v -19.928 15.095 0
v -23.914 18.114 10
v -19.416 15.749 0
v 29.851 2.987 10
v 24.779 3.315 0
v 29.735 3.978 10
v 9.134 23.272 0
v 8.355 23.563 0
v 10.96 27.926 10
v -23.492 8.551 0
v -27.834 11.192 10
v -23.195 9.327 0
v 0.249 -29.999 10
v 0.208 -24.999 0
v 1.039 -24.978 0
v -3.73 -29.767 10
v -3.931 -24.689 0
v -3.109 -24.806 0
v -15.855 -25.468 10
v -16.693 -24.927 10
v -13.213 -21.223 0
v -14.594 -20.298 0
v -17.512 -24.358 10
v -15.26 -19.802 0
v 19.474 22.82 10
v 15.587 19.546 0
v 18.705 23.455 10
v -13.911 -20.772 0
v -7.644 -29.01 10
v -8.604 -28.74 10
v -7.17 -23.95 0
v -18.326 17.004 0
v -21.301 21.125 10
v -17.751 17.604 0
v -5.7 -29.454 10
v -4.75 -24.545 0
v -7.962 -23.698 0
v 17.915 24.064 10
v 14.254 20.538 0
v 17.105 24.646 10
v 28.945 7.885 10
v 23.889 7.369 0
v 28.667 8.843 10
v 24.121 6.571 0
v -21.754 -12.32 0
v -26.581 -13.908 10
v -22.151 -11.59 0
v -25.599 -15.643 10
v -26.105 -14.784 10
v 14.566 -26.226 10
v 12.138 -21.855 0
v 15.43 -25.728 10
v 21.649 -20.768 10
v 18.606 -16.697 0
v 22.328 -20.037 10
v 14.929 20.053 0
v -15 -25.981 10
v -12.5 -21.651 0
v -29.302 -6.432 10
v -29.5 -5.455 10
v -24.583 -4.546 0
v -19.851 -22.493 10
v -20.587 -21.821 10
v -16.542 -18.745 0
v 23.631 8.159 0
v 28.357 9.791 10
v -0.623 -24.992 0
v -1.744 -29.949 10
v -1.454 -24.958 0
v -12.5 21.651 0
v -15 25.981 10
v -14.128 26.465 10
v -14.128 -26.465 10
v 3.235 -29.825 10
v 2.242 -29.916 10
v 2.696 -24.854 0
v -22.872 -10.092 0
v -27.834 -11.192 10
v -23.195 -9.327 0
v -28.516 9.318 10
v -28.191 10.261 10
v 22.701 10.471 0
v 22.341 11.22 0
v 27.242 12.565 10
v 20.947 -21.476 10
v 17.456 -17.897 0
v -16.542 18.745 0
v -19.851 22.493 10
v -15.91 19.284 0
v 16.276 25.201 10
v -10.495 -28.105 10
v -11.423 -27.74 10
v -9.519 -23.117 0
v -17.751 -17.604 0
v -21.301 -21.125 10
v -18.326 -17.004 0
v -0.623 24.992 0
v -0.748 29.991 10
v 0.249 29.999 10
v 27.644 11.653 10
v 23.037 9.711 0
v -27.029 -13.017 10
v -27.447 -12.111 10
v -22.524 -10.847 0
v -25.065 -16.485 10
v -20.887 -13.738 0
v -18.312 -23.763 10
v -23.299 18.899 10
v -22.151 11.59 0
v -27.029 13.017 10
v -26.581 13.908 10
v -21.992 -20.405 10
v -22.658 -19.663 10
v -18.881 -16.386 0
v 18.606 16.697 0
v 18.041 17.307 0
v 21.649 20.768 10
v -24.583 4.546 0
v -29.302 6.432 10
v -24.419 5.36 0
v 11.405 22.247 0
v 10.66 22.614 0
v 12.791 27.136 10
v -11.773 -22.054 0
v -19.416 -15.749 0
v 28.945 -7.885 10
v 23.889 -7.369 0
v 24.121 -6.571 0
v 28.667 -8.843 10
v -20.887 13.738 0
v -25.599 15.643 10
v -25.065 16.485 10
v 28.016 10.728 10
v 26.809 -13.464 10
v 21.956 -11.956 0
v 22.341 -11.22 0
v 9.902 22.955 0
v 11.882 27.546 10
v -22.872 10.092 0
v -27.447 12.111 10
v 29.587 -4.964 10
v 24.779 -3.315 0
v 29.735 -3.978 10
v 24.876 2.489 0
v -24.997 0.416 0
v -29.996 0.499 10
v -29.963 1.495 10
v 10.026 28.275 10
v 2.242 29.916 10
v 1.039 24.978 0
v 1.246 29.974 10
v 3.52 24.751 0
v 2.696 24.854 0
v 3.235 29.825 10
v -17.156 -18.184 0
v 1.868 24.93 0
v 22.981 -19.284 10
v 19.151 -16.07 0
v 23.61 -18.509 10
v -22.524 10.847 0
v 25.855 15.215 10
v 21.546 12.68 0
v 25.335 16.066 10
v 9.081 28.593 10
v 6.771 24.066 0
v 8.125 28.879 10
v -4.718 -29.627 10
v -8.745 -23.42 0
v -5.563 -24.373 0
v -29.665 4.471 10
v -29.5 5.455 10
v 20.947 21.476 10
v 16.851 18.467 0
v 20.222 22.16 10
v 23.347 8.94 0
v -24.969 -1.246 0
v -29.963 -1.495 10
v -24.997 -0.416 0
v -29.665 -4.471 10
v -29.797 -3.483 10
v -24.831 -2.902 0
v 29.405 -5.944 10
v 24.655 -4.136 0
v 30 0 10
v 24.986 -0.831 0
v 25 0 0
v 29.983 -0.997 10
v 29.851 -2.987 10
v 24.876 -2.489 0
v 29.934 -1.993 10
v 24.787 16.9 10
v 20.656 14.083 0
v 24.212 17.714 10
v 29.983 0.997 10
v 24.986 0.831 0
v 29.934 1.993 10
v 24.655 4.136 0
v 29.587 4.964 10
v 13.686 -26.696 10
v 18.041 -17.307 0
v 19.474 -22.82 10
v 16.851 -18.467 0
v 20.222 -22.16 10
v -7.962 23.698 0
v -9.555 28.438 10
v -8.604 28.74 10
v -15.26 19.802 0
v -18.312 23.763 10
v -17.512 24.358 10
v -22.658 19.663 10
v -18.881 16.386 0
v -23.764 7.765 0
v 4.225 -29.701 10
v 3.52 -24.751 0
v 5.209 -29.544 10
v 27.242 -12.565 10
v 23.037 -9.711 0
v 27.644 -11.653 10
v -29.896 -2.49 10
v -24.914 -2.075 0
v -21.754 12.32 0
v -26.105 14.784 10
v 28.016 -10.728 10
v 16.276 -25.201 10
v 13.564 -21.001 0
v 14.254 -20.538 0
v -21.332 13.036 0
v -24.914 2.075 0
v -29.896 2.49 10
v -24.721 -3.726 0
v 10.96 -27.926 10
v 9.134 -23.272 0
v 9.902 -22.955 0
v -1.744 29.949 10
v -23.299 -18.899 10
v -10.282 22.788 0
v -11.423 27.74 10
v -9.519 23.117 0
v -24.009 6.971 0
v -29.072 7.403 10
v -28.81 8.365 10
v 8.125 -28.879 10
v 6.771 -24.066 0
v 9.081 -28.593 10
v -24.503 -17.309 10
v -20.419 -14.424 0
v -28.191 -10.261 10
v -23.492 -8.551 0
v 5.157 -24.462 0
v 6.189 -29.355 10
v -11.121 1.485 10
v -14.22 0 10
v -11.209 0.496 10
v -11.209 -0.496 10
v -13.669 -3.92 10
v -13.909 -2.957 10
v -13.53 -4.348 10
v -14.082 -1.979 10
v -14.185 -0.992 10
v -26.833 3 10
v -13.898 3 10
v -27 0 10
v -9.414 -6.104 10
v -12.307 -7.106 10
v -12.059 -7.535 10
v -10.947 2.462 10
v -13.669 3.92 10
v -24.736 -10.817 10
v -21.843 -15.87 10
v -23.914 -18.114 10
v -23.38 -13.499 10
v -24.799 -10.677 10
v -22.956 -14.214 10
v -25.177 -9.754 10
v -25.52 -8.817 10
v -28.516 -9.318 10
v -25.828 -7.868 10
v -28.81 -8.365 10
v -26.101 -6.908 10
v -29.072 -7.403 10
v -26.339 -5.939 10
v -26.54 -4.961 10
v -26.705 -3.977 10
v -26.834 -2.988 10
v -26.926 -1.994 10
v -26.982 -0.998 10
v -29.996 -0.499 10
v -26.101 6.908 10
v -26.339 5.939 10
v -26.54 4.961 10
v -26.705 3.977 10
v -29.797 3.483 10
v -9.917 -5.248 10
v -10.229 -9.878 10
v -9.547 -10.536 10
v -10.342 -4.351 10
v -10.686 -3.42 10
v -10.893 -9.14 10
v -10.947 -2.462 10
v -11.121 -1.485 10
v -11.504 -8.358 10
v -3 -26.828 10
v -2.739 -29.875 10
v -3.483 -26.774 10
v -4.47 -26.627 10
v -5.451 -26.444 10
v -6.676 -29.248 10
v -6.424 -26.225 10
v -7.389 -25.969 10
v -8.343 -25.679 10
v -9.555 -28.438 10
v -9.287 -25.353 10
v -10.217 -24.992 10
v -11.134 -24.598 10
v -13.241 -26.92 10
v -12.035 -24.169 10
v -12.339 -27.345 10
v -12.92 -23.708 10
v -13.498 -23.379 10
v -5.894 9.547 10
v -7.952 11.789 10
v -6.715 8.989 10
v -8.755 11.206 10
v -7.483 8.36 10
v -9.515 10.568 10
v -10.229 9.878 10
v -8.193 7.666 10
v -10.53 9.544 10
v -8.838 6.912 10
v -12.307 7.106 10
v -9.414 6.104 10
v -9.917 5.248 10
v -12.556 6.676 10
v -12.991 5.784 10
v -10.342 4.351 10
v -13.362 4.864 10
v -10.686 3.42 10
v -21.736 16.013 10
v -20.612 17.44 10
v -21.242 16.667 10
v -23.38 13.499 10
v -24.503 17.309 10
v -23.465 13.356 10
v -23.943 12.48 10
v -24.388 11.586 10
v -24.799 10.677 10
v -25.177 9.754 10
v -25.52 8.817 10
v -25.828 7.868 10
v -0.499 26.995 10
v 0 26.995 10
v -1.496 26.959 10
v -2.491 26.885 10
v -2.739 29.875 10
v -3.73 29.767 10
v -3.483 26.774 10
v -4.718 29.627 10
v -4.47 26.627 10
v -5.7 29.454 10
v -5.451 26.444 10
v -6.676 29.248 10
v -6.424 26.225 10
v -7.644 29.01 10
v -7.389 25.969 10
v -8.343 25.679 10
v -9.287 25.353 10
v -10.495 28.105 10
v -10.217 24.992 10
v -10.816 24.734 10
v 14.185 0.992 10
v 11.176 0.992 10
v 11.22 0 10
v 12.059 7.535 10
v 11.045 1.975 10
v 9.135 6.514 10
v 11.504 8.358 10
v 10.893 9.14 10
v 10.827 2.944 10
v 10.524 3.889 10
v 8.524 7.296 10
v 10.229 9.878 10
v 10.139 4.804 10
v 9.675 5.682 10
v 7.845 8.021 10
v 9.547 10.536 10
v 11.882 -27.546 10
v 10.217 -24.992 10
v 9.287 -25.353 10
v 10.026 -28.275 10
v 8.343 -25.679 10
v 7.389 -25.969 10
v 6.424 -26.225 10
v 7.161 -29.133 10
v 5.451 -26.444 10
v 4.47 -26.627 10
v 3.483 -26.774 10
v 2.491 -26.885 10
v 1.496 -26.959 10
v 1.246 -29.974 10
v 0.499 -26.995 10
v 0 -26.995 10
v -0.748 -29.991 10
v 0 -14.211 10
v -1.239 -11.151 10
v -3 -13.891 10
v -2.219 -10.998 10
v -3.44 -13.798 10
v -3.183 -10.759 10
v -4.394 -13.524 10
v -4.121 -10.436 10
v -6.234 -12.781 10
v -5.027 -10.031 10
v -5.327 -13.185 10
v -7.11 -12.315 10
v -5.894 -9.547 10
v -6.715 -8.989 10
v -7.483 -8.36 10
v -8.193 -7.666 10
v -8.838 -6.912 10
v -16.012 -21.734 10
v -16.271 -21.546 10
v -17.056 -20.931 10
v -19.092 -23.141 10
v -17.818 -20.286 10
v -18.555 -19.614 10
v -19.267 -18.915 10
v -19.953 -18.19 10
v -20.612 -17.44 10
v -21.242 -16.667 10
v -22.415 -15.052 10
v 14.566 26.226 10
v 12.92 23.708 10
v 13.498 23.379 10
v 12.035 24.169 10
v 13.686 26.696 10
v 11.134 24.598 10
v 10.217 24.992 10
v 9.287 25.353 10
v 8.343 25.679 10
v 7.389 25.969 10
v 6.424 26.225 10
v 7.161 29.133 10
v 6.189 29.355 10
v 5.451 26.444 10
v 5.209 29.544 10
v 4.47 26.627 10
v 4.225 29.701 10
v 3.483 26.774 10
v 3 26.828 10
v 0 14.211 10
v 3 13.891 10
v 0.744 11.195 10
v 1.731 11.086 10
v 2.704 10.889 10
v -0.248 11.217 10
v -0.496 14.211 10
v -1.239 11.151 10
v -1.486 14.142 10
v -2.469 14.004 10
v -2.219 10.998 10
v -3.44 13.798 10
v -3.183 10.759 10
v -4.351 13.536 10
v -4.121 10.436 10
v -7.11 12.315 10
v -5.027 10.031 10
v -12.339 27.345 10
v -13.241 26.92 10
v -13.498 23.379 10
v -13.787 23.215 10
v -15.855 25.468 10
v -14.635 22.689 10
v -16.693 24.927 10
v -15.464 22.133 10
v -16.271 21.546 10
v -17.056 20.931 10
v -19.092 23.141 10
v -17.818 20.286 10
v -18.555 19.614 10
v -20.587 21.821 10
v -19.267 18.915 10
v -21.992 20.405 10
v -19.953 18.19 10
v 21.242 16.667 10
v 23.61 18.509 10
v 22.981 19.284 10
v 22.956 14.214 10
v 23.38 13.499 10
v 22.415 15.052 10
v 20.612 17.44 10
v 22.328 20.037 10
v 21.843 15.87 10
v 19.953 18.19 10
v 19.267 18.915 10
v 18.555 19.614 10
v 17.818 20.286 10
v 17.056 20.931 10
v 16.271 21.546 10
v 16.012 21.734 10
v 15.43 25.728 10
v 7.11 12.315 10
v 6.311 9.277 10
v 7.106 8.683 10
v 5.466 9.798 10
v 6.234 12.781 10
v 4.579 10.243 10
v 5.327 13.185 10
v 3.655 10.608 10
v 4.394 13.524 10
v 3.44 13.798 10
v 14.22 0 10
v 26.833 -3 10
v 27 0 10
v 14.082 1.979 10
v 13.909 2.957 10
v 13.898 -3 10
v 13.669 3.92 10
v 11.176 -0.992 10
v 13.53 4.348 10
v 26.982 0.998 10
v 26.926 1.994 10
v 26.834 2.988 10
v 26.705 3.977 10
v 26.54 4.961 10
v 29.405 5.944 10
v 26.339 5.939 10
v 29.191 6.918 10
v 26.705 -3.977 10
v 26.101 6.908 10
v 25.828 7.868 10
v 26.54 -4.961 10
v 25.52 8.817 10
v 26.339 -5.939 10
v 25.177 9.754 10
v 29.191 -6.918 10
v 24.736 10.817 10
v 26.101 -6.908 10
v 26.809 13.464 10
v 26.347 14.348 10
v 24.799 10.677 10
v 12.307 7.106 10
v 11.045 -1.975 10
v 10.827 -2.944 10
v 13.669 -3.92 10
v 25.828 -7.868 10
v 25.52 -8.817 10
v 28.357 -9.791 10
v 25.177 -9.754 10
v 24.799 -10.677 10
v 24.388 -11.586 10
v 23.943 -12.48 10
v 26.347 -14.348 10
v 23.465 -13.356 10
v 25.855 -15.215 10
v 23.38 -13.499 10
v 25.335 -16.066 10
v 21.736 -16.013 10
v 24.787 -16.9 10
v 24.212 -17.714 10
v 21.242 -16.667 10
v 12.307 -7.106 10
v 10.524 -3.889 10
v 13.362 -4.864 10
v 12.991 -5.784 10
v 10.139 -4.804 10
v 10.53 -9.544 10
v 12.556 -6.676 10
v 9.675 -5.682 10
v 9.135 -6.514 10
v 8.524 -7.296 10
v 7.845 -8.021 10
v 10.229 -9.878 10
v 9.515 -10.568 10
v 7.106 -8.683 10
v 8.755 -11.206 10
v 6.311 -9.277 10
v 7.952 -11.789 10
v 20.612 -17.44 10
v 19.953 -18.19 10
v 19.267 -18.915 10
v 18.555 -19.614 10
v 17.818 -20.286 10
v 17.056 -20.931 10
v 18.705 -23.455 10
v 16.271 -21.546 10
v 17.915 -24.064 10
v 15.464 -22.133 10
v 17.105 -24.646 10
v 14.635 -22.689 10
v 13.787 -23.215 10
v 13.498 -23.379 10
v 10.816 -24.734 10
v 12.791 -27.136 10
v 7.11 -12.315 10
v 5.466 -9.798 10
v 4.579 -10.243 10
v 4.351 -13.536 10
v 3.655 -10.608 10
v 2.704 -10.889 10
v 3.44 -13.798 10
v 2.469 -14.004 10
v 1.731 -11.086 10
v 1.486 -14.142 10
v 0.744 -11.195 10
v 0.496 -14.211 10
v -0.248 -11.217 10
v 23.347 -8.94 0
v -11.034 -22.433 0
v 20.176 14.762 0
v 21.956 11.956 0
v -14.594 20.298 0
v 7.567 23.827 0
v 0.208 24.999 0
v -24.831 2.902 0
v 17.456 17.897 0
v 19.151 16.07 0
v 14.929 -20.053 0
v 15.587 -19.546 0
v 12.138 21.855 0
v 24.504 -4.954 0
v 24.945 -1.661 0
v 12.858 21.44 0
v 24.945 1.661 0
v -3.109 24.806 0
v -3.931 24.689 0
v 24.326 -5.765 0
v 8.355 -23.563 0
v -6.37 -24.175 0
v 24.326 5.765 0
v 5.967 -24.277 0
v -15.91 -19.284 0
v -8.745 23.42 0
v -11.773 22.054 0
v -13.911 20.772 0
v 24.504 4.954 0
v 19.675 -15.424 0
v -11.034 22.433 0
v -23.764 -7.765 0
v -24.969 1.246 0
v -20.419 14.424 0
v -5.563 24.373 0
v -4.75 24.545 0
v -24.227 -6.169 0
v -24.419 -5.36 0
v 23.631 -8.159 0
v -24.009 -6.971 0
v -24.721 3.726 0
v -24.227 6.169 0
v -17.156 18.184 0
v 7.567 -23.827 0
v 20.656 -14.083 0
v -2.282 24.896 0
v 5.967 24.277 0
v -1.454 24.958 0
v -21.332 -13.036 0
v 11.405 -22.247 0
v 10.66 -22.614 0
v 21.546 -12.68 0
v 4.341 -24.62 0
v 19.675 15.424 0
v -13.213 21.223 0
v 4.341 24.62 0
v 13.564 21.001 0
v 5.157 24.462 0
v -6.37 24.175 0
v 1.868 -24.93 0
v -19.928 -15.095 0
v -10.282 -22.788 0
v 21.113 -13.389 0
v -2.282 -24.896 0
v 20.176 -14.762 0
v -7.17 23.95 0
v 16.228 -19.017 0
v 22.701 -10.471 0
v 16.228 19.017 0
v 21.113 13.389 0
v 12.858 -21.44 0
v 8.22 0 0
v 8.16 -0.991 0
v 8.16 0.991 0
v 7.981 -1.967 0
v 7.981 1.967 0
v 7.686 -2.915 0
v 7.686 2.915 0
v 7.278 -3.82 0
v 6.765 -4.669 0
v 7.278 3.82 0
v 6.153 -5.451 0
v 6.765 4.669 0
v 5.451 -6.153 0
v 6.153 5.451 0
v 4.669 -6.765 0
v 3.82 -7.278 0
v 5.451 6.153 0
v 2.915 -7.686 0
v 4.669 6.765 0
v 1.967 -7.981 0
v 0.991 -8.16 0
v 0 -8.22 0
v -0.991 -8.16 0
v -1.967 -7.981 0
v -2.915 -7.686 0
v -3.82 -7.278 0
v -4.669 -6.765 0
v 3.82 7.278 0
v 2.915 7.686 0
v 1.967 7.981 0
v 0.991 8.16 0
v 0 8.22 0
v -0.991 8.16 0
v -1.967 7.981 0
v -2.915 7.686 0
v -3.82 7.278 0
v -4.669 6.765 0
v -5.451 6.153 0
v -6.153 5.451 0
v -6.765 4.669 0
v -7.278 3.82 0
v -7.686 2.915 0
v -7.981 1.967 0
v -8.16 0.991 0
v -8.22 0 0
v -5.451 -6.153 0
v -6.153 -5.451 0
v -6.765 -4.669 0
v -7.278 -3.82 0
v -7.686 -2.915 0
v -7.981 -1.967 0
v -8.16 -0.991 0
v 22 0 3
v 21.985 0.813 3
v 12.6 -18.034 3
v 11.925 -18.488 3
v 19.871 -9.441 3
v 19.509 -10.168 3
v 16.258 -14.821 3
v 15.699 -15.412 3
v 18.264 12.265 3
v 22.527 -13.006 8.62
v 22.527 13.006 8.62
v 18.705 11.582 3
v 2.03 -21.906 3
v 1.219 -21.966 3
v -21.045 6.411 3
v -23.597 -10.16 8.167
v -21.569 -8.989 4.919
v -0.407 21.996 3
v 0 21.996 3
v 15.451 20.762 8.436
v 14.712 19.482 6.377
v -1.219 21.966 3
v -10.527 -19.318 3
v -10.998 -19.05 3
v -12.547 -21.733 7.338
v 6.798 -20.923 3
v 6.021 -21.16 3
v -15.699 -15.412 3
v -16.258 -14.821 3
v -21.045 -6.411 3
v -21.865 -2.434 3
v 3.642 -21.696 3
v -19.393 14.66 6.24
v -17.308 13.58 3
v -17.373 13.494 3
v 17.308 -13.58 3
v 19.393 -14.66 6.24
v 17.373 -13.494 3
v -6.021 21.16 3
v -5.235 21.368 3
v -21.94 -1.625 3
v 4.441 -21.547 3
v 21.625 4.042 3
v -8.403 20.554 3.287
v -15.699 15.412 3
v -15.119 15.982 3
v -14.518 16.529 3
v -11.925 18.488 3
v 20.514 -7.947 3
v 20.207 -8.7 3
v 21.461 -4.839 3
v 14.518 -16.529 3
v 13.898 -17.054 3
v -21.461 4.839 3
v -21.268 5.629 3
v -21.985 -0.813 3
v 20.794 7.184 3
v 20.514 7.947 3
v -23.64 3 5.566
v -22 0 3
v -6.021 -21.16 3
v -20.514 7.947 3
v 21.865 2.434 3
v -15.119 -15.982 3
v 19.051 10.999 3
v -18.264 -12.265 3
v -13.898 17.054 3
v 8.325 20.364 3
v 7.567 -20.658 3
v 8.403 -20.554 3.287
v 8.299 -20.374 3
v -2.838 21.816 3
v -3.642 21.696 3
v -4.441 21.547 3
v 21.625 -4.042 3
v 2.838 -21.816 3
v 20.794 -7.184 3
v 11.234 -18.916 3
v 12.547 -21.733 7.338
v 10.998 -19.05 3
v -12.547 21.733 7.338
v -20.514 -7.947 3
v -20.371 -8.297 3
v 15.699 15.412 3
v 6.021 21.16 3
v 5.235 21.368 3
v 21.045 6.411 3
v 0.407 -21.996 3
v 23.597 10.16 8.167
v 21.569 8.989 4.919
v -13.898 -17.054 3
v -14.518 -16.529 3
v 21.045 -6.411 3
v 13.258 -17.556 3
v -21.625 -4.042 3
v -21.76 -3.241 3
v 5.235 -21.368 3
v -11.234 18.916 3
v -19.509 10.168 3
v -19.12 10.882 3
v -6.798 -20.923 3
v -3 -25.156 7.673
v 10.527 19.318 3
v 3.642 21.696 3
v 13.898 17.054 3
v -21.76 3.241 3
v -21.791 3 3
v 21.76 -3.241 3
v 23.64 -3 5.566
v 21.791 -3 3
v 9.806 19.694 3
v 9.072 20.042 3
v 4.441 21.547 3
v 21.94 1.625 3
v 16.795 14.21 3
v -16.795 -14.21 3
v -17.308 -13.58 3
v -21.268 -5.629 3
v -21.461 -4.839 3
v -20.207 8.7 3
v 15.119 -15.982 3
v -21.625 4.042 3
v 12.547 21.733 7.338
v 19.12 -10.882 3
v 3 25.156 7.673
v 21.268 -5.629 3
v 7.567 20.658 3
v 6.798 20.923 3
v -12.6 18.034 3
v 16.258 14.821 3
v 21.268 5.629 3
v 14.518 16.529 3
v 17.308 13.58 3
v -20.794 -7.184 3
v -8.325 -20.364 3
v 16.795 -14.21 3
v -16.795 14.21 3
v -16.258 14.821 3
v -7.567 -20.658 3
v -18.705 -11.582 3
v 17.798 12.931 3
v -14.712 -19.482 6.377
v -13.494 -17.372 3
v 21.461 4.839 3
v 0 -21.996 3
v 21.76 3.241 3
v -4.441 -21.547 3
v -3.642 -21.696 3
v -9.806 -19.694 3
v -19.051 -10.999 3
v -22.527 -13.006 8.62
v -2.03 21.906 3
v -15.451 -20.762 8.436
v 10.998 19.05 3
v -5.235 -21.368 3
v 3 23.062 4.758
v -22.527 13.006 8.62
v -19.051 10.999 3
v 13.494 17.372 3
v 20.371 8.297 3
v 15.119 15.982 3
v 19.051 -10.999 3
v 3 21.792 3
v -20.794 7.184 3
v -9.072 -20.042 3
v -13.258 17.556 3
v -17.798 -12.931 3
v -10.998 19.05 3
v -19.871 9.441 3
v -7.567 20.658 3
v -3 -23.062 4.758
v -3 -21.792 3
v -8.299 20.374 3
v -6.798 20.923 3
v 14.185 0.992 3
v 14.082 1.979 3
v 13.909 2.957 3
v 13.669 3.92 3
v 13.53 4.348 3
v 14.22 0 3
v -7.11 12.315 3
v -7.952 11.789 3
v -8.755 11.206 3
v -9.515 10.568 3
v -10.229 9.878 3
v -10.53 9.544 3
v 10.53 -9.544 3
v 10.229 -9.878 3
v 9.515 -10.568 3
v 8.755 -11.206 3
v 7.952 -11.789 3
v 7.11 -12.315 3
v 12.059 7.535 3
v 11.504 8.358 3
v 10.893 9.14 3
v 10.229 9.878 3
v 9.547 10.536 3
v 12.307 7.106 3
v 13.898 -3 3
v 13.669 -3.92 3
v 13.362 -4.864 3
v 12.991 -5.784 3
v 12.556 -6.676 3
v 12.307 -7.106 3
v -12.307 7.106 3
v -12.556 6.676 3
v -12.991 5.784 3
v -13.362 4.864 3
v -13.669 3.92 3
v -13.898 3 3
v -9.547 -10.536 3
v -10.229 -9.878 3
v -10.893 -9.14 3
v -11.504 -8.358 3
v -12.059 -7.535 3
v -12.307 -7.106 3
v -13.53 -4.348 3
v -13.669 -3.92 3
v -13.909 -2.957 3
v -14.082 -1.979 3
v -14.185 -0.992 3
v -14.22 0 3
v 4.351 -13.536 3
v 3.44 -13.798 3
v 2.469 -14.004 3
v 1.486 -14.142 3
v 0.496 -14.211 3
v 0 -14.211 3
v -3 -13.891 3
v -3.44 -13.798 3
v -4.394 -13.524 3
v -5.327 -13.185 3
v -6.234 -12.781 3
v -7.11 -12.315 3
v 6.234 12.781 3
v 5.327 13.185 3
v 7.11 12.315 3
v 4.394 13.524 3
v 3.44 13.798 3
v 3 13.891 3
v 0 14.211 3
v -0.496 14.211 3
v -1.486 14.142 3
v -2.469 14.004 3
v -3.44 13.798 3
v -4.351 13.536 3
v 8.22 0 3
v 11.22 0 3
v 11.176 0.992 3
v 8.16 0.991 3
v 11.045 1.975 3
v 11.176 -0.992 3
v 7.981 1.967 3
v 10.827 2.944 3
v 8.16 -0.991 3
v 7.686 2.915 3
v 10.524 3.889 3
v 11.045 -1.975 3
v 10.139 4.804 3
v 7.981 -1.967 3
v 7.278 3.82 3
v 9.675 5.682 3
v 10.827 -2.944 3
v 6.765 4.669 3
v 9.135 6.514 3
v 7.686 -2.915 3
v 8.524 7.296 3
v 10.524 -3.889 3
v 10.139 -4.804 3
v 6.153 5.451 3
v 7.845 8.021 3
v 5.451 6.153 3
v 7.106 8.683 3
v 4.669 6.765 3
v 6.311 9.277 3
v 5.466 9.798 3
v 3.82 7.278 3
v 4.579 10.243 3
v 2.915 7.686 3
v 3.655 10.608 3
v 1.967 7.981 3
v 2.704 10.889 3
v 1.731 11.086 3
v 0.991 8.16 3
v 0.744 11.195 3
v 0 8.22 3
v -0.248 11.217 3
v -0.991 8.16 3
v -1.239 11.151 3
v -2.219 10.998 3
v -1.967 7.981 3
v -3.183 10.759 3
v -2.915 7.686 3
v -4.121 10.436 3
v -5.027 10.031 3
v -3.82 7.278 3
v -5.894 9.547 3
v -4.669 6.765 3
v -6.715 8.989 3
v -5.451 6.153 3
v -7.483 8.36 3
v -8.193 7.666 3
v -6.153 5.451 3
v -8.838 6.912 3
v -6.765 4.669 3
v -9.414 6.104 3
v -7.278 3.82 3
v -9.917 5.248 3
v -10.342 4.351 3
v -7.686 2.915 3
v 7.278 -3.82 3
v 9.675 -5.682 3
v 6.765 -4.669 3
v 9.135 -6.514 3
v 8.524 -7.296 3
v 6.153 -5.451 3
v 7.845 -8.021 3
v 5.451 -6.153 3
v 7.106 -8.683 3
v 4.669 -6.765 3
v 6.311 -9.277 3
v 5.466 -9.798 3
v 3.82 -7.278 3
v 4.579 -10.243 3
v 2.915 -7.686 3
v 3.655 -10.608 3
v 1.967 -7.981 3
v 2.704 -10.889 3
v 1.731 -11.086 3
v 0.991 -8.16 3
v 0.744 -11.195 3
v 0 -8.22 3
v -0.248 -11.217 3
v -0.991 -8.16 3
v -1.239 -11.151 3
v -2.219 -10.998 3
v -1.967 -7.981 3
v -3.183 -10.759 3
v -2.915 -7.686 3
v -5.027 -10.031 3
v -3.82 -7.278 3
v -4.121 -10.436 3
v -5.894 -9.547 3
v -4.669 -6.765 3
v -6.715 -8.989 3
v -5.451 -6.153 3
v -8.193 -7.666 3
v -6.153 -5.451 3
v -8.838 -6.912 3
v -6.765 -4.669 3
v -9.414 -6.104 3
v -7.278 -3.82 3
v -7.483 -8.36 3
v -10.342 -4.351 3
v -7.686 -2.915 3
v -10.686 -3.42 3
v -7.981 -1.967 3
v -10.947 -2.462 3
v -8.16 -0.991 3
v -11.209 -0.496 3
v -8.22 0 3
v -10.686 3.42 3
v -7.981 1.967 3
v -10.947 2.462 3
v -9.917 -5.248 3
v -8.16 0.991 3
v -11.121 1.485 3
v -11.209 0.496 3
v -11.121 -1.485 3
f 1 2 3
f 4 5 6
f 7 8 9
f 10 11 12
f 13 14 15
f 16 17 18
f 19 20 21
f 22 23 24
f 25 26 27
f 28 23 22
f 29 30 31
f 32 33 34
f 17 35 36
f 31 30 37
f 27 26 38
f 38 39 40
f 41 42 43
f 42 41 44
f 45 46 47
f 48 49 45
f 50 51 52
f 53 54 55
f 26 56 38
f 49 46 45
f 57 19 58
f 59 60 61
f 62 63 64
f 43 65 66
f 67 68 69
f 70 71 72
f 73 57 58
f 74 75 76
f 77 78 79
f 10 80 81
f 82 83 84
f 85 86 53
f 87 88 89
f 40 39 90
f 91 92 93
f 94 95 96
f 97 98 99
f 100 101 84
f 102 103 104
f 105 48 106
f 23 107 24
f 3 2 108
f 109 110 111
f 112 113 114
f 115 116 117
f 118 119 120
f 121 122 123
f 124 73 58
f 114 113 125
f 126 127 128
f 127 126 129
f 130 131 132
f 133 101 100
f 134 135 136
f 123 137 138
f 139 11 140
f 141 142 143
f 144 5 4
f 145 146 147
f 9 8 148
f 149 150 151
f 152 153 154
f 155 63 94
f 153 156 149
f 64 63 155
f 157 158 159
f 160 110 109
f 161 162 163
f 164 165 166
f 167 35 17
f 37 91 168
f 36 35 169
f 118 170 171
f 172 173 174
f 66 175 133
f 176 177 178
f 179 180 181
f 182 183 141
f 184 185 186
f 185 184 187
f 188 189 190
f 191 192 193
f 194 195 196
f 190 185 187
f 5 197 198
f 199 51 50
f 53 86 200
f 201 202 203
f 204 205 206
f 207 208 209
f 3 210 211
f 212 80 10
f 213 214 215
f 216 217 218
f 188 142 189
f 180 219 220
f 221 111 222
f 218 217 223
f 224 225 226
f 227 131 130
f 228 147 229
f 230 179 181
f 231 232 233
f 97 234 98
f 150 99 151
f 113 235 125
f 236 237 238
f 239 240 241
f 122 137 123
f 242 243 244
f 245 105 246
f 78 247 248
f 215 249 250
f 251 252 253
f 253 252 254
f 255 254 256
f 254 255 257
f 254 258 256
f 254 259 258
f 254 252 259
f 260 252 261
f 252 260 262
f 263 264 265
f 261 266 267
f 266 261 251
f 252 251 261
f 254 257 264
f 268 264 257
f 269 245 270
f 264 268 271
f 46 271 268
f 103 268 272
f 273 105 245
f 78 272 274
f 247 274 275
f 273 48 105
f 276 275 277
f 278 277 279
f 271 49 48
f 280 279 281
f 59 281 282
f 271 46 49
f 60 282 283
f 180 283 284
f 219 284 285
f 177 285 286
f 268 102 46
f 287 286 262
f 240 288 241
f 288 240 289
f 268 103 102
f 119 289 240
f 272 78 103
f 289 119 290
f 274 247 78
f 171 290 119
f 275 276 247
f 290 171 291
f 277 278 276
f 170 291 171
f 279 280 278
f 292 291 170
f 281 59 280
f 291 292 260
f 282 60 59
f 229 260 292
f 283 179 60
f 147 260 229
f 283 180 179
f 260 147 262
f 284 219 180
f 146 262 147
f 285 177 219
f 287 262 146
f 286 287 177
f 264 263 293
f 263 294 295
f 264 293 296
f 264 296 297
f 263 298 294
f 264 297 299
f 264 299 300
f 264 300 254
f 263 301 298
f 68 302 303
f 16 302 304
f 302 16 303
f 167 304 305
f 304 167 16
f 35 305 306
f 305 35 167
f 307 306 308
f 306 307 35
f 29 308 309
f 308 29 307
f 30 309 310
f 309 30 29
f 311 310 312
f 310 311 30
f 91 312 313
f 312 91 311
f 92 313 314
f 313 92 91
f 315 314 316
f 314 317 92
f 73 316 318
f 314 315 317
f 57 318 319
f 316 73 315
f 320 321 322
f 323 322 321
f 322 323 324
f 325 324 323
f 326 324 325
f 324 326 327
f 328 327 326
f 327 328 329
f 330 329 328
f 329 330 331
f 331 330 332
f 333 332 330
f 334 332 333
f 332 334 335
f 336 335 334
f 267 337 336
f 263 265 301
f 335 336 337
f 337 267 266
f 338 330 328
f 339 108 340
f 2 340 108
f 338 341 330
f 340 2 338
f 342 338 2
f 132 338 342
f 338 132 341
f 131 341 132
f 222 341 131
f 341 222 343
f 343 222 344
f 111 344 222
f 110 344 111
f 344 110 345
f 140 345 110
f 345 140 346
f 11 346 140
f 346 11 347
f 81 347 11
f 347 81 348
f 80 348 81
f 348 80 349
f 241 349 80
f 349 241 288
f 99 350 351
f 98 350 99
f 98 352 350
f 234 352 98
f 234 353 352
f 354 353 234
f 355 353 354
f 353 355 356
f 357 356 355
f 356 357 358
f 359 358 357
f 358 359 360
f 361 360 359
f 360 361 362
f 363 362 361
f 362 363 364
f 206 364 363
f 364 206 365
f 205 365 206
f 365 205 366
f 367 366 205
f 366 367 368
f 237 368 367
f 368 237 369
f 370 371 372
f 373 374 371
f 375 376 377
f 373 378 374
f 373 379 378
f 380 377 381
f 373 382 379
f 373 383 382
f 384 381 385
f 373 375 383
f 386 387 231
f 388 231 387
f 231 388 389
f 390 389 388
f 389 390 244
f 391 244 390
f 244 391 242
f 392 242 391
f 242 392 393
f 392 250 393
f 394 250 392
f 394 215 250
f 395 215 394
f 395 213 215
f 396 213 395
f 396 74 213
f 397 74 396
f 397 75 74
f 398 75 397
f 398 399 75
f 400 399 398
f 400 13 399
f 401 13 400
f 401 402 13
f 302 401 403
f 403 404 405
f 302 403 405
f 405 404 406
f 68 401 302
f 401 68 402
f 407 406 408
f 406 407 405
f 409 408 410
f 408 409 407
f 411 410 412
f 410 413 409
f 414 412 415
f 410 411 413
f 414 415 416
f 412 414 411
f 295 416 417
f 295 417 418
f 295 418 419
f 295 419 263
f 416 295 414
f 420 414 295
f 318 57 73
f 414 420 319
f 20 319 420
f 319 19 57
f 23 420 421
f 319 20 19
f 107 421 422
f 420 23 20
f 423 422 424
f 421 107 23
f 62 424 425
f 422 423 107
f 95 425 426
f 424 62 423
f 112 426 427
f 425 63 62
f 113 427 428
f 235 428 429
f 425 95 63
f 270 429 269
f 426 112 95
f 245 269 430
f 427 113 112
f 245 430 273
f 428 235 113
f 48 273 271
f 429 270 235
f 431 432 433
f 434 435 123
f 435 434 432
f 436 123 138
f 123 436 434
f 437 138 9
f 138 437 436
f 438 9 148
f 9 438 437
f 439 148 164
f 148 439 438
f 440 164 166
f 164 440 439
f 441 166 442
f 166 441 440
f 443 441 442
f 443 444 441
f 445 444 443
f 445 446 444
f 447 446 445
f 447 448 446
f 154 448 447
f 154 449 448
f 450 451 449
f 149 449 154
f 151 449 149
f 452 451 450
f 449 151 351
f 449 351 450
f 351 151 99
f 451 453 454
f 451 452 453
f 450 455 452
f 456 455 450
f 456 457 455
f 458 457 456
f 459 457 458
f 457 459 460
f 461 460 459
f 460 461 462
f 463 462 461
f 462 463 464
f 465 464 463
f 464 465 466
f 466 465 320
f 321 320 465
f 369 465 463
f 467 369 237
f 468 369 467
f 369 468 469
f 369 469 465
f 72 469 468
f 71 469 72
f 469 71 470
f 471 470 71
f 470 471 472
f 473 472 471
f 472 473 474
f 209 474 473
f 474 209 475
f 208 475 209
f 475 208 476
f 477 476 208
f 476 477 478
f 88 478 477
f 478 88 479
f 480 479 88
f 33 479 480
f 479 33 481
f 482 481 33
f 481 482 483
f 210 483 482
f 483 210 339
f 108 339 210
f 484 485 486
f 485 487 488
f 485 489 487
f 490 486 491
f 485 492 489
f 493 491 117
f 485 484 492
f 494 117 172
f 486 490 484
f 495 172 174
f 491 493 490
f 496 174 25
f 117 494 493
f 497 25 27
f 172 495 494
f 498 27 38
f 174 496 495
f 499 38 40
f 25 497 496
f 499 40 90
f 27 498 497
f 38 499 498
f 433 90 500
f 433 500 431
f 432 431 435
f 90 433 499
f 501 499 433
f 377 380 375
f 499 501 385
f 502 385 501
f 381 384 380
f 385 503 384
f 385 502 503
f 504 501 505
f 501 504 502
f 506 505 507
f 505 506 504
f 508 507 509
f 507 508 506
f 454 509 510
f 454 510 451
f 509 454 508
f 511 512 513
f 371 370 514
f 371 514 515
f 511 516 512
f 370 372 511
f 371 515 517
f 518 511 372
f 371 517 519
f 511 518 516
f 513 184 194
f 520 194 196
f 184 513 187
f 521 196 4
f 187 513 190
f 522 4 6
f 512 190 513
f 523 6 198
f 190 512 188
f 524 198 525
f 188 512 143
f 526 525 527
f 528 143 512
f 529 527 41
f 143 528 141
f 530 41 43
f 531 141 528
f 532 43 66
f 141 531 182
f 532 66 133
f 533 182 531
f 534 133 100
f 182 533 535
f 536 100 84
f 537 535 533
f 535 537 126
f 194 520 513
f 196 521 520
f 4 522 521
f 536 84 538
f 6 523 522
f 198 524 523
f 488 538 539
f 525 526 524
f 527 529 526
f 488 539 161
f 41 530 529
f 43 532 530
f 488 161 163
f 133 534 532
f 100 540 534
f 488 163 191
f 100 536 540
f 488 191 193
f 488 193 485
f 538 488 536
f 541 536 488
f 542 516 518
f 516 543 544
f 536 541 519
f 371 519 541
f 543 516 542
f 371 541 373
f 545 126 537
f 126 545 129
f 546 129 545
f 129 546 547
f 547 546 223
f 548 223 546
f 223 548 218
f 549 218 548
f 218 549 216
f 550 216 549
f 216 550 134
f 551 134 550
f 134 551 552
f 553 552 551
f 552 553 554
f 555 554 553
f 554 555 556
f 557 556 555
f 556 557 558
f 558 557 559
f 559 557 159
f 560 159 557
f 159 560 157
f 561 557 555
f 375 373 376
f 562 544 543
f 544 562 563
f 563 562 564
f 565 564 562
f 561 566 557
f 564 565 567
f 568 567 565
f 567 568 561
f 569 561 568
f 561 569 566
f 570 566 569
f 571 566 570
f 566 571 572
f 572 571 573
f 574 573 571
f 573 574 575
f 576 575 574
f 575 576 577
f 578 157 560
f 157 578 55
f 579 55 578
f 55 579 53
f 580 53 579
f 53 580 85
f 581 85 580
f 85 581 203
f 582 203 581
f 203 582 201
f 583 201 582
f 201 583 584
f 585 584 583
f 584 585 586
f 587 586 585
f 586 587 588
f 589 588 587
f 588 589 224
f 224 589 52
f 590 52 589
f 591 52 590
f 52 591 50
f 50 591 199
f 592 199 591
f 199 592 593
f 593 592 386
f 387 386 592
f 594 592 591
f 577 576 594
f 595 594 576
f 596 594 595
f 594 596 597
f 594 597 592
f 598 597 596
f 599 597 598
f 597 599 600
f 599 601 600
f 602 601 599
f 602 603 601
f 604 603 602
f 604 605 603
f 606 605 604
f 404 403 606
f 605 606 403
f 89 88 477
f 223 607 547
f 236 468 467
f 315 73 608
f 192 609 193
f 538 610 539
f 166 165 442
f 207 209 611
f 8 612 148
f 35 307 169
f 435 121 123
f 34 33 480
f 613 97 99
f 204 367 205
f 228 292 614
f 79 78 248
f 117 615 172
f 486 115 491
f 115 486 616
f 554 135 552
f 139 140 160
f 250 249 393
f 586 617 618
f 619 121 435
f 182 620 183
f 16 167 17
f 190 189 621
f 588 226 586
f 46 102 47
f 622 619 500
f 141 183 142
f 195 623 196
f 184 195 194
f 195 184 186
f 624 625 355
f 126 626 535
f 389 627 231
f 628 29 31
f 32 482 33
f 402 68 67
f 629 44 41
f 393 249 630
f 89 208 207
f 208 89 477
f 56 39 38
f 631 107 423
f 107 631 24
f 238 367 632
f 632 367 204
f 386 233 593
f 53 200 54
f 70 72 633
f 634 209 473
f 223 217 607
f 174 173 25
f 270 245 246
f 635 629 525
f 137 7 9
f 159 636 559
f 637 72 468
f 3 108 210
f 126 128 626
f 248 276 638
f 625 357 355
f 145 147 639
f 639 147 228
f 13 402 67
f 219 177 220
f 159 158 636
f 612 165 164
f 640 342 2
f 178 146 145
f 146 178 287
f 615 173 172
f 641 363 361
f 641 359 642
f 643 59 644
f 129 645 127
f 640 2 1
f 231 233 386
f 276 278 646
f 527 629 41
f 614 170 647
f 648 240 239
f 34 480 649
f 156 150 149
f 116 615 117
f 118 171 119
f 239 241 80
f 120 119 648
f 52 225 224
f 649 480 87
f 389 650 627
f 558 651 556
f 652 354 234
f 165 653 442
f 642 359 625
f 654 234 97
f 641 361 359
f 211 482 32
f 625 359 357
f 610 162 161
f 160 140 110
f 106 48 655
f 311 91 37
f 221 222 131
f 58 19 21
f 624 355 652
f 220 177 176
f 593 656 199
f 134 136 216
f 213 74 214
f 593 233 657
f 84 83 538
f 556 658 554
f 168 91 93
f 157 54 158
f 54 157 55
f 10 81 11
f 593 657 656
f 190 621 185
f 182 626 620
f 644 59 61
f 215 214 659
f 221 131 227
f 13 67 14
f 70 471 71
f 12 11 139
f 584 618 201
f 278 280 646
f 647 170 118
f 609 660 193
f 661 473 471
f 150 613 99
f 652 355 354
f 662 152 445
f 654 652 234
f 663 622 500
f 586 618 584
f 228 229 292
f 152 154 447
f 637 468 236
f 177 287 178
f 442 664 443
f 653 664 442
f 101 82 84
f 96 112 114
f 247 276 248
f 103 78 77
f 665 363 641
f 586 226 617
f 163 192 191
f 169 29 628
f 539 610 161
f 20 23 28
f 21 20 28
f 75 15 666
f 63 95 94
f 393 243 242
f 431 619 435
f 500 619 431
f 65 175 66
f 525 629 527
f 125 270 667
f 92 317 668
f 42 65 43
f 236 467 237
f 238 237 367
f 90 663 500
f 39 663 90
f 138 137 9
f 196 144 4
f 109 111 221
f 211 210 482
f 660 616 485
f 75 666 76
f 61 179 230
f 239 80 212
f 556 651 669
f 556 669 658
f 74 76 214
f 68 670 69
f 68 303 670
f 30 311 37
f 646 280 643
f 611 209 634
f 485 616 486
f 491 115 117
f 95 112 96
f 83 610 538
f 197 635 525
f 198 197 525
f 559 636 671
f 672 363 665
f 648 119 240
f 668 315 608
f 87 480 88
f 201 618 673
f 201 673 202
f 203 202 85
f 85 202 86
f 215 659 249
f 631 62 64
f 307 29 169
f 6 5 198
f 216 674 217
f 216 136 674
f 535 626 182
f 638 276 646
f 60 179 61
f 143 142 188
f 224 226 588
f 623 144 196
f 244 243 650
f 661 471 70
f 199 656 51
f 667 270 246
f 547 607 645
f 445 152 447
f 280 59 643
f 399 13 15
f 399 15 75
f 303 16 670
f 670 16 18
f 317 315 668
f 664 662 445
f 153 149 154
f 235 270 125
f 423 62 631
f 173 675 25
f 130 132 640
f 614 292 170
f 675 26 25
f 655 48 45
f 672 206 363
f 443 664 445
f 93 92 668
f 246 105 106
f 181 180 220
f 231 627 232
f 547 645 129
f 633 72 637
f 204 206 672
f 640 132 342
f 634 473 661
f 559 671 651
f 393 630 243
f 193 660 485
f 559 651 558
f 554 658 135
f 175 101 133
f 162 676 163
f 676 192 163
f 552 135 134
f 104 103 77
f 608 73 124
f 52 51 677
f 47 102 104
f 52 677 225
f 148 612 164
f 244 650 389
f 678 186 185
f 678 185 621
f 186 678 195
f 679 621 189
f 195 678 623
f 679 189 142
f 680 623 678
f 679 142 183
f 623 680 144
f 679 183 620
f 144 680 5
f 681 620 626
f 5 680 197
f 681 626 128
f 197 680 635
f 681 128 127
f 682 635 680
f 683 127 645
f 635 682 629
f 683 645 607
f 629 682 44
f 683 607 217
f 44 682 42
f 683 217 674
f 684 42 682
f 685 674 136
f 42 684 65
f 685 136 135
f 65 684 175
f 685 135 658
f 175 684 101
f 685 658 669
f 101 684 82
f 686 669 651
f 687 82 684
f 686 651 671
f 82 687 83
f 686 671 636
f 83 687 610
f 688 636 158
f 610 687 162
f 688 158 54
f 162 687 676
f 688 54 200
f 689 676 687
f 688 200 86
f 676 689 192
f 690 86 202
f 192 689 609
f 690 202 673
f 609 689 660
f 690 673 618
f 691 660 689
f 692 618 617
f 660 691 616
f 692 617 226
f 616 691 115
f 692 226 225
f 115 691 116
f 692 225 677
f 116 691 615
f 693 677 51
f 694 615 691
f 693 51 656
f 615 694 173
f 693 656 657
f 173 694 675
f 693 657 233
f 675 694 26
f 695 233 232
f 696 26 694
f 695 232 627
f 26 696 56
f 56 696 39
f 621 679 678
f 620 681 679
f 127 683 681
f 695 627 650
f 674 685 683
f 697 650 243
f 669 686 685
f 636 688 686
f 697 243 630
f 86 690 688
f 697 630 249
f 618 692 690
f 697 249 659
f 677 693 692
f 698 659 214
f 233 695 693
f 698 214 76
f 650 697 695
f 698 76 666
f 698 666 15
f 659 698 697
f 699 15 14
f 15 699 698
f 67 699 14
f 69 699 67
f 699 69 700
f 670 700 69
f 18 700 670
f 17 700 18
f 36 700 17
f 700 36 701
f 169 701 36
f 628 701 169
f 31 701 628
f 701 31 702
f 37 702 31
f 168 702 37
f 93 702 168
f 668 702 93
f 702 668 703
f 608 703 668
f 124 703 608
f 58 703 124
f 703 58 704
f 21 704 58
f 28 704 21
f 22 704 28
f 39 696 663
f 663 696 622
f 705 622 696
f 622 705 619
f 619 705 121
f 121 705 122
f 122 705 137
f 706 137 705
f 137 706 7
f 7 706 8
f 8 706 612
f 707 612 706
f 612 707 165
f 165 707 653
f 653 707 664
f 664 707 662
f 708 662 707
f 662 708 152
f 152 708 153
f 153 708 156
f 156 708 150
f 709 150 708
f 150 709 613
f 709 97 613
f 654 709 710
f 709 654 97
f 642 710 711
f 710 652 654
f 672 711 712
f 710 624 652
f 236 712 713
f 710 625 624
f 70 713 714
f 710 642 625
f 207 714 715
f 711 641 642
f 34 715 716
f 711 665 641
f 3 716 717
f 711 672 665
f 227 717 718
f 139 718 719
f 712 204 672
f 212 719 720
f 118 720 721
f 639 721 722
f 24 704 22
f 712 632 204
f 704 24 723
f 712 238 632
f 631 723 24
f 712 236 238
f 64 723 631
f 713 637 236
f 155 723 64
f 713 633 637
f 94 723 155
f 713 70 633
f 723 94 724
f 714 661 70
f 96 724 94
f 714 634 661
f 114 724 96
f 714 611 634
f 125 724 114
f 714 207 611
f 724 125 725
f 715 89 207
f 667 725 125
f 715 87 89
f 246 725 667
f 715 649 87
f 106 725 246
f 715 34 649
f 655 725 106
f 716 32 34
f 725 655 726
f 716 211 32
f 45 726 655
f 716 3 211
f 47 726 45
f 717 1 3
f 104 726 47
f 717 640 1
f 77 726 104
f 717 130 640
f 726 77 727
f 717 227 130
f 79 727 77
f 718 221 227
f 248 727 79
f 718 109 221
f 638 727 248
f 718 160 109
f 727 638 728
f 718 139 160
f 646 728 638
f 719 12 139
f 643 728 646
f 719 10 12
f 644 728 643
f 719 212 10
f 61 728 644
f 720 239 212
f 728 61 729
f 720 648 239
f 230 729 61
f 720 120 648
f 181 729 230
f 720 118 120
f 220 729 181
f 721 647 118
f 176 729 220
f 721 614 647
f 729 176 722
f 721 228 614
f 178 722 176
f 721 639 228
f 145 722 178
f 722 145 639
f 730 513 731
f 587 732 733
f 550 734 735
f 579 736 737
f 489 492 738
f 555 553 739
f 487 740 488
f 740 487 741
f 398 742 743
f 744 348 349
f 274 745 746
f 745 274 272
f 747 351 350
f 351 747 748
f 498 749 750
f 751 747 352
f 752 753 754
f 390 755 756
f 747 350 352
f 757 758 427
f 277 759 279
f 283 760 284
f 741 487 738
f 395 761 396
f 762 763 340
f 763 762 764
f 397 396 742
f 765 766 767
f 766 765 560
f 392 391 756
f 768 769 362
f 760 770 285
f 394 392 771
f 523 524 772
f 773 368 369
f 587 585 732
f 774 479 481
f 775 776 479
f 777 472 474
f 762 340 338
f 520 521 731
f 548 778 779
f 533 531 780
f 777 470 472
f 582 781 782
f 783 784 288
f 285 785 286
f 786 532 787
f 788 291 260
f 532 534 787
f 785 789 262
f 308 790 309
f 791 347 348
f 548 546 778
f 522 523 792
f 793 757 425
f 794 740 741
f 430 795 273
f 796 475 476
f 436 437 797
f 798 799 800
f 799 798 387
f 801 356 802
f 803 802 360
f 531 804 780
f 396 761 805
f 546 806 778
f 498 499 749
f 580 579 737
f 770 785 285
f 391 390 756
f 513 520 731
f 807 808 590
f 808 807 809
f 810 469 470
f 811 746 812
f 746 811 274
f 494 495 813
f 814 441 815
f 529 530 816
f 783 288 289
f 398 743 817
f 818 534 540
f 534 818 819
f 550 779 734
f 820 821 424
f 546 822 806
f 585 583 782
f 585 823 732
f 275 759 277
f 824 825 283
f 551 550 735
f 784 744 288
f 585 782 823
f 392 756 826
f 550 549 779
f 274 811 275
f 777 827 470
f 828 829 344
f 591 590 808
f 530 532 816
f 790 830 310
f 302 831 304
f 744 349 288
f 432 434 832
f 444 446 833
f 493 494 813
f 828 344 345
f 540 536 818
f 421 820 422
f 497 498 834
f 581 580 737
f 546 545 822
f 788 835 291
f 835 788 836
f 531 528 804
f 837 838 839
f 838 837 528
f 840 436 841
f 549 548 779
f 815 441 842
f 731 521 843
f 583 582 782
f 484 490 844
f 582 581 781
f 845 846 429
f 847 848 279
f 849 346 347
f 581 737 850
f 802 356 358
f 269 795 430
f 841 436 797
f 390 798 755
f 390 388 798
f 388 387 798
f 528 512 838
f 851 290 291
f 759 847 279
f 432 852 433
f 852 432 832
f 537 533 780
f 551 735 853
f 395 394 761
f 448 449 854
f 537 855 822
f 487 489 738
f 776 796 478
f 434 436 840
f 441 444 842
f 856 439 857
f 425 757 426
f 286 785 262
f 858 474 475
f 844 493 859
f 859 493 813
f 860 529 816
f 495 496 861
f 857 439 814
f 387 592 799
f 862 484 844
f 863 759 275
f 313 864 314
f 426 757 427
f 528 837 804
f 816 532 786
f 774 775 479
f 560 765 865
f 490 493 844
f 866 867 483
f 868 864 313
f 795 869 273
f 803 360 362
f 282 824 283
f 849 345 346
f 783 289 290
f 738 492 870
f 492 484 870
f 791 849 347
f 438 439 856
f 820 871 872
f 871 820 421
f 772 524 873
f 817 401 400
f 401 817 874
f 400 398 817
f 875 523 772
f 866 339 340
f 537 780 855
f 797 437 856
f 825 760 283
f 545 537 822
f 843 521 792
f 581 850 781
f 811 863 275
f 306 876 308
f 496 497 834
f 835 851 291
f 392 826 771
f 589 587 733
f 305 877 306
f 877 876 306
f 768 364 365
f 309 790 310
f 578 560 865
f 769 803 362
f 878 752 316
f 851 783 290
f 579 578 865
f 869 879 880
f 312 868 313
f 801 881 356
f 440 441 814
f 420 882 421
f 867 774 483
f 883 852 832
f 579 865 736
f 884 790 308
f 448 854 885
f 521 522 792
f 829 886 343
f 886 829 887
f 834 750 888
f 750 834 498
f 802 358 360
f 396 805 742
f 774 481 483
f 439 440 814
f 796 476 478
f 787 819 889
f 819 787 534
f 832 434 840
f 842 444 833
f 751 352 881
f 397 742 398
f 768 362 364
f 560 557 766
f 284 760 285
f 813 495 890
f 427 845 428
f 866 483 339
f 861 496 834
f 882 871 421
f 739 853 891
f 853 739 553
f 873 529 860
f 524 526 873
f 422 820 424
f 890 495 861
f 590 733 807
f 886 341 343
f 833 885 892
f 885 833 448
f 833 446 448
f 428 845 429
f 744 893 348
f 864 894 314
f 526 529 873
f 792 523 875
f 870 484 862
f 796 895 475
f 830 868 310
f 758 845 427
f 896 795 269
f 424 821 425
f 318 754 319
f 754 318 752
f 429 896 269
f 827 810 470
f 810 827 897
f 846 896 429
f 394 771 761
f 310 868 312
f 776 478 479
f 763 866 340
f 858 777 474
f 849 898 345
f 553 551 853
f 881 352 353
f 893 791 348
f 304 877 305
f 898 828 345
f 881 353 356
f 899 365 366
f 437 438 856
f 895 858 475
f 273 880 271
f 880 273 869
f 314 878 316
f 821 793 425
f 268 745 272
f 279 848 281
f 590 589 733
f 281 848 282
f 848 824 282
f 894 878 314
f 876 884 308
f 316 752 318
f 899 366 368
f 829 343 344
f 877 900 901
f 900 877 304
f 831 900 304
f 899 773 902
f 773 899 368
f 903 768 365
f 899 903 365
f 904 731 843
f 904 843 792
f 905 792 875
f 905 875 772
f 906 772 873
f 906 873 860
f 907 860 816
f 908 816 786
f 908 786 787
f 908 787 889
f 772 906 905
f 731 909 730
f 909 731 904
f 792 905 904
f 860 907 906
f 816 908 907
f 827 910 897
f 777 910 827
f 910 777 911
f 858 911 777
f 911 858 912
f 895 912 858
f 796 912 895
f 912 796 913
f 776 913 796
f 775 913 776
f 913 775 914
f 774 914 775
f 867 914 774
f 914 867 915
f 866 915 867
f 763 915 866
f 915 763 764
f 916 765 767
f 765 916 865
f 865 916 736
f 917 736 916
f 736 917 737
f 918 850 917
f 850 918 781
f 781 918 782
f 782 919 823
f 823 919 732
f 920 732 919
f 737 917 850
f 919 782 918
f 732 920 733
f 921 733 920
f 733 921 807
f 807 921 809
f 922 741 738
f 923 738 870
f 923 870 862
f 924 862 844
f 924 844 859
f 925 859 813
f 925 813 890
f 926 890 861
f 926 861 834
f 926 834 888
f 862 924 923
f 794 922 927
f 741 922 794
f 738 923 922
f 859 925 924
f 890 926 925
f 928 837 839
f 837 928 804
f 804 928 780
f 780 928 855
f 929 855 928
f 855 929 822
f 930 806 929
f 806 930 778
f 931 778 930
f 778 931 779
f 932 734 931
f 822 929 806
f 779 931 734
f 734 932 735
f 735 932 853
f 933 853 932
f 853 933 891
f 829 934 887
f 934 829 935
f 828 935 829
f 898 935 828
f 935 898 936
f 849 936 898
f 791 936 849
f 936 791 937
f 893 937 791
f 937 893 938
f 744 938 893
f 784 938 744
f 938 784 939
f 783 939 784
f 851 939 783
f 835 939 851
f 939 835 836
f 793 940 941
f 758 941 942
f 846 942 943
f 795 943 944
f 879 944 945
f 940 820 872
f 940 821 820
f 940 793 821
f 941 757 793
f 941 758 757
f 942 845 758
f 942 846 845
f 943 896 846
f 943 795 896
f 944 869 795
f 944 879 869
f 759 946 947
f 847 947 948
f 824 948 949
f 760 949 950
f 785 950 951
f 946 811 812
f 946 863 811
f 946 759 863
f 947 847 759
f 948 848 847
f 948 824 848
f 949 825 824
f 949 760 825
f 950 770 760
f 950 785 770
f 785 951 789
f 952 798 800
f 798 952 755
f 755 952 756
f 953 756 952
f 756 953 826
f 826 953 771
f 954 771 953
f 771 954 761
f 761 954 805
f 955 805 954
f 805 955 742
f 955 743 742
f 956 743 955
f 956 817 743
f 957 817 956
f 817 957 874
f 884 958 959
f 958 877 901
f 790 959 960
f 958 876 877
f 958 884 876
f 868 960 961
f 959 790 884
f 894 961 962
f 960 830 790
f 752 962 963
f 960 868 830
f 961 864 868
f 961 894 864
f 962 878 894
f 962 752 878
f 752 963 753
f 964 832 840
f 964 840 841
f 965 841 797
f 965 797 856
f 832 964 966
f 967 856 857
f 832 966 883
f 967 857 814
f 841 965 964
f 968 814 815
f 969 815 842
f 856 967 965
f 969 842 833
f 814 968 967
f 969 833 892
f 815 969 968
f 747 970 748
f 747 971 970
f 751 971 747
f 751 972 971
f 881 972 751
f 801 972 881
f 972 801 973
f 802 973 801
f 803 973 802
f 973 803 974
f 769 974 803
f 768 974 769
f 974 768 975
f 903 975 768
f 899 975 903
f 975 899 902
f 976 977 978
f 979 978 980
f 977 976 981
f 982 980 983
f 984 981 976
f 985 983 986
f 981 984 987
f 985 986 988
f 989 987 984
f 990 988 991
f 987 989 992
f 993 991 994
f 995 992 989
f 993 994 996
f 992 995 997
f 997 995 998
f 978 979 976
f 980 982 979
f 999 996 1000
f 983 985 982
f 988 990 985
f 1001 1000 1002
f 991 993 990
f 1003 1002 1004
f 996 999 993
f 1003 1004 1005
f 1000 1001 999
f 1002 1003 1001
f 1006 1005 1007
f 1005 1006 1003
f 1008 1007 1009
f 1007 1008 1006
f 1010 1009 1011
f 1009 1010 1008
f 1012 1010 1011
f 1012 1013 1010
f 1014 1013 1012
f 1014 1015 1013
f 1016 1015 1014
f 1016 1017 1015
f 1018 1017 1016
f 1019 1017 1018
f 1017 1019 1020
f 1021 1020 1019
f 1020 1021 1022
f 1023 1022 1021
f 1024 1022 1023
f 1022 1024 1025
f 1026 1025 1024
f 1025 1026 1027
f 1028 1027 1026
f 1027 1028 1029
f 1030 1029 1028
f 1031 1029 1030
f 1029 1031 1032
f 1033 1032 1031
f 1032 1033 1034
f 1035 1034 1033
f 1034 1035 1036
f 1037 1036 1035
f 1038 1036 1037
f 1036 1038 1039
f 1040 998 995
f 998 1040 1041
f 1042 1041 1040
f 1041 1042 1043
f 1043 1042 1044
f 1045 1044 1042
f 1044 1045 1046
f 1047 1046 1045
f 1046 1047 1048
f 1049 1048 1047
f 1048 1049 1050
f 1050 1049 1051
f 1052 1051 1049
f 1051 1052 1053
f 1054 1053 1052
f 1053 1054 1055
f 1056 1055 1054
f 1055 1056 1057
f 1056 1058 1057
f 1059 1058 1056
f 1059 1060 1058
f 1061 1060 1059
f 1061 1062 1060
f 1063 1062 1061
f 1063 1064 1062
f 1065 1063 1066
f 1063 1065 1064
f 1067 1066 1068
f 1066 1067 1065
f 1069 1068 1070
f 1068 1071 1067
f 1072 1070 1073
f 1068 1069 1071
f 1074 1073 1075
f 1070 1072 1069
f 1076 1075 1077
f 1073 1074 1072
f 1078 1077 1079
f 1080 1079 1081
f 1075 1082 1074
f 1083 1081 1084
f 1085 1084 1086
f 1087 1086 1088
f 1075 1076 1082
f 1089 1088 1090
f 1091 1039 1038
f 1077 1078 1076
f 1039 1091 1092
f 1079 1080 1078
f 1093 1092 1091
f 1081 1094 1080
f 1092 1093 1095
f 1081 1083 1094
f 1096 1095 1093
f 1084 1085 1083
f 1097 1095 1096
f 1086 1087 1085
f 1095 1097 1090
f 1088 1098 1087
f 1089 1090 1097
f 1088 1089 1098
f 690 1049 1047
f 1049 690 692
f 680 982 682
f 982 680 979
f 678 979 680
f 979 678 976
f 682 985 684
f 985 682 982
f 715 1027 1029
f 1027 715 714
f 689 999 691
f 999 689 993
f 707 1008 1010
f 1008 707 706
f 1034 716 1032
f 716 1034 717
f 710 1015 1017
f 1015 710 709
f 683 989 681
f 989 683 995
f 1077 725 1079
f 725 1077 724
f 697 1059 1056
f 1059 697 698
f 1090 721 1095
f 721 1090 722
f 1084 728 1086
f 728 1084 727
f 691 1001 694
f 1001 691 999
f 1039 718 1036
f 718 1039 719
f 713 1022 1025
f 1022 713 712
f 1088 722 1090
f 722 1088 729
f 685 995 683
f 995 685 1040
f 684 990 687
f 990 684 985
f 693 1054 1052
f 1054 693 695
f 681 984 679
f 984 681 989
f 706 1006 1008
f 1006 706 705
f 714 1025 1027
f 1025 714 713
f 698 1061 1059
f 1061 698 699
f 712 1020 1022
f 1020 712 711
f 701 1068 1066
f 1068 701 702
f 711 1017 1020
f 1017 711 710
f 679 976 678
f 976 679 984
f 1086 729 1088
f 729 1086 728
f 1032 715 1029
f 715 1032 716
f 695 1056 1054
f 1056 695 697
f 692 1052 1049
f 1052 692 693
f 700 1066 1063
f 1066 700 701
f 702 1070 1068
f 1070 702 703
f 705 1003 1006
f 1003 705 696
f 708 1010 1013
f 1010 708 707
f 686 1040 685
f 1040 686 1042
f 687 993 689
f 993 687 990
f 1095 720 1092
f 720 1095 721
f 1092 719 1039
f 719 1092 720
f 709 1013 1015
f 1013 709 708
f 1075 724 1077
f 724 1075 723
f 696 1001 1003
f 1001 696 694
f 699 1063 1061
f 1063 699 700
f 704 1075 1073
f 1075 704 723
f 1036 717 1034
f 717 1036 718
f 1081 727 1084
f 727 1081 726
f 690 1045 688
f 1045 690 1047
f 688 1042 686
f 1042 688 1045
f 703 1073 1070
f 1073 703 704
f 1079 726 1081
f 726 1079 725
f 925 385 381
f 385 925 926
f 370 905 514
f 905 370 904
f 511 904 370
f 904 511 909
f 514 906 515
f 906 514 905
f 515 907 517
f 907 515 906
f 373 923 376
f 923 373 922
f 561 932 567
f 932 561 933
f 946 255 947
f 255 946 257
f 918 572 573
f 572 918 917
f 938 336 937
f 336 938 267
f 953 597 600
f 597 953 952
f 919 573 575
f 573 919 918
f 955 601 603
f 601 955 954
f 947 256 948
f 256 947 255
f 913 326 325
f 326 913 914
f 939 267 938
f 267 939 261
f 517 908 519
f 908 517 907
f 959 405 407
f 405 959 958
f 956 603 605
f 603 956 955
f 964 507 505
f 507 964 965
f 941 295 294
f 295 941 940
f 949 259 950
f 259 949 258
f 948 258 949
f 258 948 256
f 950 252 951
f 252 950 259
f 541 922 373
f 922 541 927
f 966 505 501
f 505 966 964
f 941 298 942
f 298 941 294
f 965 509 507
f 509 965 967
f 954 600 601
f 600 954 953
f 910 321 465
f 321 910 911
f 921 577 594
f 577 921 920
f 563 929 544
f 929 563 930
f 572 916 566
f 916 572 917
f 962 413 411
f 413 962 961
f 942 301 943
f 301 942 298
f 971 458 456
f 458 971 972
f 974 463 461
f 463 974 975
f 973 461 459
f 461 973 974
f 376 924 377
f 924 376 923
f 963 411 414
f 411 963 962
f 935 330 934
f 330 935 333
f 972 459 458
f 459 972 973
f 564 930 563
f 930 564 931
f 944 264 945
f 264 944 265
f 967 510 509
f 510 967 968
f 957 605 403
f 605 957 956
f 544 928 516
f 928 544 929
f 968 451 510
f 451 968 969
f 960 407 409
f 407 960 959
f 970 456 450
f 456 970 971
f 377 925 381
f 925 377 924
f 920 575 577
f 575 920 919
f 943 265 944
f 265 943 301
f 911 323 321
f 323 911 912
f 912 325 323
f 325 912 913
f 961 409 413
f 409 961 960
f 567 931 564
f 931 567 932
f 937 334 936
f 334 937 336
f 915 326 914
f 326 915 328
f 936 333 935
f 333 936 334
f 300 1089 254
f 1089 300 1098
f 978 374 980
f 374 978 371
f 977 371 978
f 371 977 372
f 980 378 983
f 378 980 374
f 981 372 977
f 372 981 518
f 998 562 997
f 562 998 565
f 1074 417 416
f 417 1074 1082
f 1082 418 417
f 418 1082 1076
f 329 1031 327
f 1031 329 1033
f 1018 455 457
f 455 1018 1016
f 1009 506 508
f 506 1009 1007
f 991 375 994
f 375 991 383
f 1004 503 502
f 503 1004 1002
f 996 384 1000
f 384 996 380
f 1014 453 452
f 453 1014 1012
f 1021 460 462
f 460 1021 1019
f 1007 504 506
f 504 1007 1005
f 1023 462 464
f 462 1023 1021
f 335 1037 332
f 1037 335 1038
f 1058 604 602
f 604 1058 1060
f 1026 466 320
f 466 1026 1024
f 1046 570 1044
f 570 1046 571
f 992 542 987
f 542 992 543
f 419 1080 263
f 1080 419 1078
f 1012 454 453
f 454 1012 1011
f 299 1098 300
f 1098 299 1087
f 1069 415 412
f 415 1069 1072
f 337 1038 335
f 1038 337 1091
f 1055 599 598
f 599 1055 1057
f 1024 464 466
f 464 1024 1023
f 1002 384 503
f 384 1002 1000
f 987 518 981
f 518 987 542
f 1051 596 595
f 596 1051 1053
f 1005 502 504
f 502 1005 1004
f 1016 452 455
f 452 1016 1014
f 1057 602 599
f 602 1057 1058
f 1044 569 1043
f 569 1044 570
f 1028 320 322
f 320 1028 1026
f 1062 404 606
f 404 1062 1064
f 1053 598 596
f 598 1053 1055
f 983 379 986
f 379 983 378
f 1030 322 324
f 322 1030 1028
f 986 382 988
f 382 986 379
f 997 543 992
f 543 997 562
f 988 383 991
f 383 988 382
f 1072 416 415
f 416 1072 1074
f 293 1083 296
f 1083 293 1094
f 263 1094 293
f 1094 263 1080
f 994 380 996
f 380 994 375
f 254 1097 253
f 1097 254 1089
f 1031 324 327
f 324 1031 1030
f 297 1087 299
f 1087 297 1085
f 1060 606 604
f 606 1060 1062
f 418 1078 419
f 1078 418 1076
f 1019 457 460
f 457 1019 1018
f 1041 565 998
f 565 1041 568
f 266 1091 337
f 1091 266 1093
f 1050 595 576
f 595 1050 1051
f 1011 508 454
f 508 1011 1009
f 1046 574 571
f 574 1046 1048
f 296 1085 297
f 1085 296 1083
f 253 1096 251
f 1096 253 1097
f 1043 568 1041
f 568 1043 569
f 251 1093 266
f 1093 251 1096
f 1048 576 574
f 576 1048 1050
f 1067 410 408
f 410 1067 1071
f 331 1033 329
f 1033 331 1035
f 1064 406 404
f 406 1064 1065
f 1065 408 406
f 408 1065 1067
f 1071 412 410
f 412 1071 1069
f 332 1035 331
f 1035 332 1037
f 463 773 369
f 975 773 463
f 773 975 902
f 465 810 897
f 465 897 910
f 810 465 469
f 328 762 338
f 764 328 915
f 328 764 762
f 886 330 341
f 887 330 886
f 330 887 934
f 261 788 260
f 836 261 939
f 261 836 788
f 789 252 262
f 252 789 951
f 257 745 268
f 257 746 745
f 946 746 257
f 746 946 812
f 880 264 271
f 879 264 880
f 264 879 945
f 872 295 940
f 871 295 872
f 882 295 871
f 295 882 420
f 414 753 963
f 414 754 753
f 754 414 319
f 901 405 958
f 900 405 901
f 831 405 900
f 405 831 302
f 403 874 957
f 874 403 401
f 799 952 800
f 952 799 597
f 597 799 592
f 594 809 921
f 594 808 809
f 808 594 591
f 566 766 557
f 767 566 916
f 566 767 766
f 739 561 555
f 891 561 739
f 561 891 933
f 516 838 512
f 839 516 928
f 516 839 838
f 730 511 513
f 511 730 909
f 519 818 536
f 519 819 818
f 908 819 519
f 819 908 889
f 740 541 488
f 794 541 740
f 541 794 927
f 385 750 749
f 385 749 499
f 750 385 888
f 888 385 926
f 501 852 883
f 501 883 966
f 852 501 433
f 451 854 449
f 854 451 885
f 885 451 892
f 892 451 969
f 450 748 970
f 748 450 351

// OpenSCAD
/* Builds a reel hub that handles most common reel sizes.
   For FlashForge Inventor, the reel stand needs to be replaced.
   See reel-holder.scad for details.

   Uses commonly available skate board bearings.
*/

$fa=1;
$fs=1;

BearingDiameter = 22;
BearingID = 8;
BearingHeight = 7;
MinReelDiameter=50;
MaxReelDiameter=60;
MaxIntrusion=10; // Maximum depth to penetrate into the reel hub
WallThickness = 3;

// Add 2% to the radius to compensate for the interior polygon effect
BearingOuterRadius = BearingDiameter * 1.02 / 2;
BearingInnerRadius = BearingOuterRadius - WallThickness;

// Outer reel cone and top plate
difference(){
    cylinder(r2=MaxReelDiameter/2, r1=MinReelDiameter/2, h=MaxIntrusion);
    translate([0,0,MaxIntrusion-BearingHeight]){
        cylinder(r2=MaxReelDiameter/2-WallThickness, r1=MinReelDiameter/2-WallThickness, h=BearingHeight);
    }
    cylinder(r=BearingInnerRadius, h=MaxIntrusion);
}

// Inner bearing holder ring
translate([0,0,MaxIntrusion-BearingHeight]){
    difference(){
        cylinder(r=BearingOuterRadius+WallThickness, h=BearingHeight);
        cylinder(r=BearingOuterRadius, h=BearingHeight);
    }
}

// Bracing between the two
intersection(){
    translate([0,0,MaxIntrusion-BearingHeight]){
        for (i = [1:12]){
            rotate(a=360*i/12,v=[0,0,1]){
                difference(){
                    cube([WallThickness, MaxReelDiameter/2, BearingHeight]);
                    cube([WallThickness, BearingOuterRadius, BearingHeight]);
                }
            }
        }
    }
    difference(){
        cylinder(r2=MaxReelDiameter/2-WallThickness, r1=MinReelDiameter/2-WallThickness, h=MaxIntrusion);
        cylinder(r=BearingOuterRadius+WallThickness, h=MaxIntrusion);
    }
}
